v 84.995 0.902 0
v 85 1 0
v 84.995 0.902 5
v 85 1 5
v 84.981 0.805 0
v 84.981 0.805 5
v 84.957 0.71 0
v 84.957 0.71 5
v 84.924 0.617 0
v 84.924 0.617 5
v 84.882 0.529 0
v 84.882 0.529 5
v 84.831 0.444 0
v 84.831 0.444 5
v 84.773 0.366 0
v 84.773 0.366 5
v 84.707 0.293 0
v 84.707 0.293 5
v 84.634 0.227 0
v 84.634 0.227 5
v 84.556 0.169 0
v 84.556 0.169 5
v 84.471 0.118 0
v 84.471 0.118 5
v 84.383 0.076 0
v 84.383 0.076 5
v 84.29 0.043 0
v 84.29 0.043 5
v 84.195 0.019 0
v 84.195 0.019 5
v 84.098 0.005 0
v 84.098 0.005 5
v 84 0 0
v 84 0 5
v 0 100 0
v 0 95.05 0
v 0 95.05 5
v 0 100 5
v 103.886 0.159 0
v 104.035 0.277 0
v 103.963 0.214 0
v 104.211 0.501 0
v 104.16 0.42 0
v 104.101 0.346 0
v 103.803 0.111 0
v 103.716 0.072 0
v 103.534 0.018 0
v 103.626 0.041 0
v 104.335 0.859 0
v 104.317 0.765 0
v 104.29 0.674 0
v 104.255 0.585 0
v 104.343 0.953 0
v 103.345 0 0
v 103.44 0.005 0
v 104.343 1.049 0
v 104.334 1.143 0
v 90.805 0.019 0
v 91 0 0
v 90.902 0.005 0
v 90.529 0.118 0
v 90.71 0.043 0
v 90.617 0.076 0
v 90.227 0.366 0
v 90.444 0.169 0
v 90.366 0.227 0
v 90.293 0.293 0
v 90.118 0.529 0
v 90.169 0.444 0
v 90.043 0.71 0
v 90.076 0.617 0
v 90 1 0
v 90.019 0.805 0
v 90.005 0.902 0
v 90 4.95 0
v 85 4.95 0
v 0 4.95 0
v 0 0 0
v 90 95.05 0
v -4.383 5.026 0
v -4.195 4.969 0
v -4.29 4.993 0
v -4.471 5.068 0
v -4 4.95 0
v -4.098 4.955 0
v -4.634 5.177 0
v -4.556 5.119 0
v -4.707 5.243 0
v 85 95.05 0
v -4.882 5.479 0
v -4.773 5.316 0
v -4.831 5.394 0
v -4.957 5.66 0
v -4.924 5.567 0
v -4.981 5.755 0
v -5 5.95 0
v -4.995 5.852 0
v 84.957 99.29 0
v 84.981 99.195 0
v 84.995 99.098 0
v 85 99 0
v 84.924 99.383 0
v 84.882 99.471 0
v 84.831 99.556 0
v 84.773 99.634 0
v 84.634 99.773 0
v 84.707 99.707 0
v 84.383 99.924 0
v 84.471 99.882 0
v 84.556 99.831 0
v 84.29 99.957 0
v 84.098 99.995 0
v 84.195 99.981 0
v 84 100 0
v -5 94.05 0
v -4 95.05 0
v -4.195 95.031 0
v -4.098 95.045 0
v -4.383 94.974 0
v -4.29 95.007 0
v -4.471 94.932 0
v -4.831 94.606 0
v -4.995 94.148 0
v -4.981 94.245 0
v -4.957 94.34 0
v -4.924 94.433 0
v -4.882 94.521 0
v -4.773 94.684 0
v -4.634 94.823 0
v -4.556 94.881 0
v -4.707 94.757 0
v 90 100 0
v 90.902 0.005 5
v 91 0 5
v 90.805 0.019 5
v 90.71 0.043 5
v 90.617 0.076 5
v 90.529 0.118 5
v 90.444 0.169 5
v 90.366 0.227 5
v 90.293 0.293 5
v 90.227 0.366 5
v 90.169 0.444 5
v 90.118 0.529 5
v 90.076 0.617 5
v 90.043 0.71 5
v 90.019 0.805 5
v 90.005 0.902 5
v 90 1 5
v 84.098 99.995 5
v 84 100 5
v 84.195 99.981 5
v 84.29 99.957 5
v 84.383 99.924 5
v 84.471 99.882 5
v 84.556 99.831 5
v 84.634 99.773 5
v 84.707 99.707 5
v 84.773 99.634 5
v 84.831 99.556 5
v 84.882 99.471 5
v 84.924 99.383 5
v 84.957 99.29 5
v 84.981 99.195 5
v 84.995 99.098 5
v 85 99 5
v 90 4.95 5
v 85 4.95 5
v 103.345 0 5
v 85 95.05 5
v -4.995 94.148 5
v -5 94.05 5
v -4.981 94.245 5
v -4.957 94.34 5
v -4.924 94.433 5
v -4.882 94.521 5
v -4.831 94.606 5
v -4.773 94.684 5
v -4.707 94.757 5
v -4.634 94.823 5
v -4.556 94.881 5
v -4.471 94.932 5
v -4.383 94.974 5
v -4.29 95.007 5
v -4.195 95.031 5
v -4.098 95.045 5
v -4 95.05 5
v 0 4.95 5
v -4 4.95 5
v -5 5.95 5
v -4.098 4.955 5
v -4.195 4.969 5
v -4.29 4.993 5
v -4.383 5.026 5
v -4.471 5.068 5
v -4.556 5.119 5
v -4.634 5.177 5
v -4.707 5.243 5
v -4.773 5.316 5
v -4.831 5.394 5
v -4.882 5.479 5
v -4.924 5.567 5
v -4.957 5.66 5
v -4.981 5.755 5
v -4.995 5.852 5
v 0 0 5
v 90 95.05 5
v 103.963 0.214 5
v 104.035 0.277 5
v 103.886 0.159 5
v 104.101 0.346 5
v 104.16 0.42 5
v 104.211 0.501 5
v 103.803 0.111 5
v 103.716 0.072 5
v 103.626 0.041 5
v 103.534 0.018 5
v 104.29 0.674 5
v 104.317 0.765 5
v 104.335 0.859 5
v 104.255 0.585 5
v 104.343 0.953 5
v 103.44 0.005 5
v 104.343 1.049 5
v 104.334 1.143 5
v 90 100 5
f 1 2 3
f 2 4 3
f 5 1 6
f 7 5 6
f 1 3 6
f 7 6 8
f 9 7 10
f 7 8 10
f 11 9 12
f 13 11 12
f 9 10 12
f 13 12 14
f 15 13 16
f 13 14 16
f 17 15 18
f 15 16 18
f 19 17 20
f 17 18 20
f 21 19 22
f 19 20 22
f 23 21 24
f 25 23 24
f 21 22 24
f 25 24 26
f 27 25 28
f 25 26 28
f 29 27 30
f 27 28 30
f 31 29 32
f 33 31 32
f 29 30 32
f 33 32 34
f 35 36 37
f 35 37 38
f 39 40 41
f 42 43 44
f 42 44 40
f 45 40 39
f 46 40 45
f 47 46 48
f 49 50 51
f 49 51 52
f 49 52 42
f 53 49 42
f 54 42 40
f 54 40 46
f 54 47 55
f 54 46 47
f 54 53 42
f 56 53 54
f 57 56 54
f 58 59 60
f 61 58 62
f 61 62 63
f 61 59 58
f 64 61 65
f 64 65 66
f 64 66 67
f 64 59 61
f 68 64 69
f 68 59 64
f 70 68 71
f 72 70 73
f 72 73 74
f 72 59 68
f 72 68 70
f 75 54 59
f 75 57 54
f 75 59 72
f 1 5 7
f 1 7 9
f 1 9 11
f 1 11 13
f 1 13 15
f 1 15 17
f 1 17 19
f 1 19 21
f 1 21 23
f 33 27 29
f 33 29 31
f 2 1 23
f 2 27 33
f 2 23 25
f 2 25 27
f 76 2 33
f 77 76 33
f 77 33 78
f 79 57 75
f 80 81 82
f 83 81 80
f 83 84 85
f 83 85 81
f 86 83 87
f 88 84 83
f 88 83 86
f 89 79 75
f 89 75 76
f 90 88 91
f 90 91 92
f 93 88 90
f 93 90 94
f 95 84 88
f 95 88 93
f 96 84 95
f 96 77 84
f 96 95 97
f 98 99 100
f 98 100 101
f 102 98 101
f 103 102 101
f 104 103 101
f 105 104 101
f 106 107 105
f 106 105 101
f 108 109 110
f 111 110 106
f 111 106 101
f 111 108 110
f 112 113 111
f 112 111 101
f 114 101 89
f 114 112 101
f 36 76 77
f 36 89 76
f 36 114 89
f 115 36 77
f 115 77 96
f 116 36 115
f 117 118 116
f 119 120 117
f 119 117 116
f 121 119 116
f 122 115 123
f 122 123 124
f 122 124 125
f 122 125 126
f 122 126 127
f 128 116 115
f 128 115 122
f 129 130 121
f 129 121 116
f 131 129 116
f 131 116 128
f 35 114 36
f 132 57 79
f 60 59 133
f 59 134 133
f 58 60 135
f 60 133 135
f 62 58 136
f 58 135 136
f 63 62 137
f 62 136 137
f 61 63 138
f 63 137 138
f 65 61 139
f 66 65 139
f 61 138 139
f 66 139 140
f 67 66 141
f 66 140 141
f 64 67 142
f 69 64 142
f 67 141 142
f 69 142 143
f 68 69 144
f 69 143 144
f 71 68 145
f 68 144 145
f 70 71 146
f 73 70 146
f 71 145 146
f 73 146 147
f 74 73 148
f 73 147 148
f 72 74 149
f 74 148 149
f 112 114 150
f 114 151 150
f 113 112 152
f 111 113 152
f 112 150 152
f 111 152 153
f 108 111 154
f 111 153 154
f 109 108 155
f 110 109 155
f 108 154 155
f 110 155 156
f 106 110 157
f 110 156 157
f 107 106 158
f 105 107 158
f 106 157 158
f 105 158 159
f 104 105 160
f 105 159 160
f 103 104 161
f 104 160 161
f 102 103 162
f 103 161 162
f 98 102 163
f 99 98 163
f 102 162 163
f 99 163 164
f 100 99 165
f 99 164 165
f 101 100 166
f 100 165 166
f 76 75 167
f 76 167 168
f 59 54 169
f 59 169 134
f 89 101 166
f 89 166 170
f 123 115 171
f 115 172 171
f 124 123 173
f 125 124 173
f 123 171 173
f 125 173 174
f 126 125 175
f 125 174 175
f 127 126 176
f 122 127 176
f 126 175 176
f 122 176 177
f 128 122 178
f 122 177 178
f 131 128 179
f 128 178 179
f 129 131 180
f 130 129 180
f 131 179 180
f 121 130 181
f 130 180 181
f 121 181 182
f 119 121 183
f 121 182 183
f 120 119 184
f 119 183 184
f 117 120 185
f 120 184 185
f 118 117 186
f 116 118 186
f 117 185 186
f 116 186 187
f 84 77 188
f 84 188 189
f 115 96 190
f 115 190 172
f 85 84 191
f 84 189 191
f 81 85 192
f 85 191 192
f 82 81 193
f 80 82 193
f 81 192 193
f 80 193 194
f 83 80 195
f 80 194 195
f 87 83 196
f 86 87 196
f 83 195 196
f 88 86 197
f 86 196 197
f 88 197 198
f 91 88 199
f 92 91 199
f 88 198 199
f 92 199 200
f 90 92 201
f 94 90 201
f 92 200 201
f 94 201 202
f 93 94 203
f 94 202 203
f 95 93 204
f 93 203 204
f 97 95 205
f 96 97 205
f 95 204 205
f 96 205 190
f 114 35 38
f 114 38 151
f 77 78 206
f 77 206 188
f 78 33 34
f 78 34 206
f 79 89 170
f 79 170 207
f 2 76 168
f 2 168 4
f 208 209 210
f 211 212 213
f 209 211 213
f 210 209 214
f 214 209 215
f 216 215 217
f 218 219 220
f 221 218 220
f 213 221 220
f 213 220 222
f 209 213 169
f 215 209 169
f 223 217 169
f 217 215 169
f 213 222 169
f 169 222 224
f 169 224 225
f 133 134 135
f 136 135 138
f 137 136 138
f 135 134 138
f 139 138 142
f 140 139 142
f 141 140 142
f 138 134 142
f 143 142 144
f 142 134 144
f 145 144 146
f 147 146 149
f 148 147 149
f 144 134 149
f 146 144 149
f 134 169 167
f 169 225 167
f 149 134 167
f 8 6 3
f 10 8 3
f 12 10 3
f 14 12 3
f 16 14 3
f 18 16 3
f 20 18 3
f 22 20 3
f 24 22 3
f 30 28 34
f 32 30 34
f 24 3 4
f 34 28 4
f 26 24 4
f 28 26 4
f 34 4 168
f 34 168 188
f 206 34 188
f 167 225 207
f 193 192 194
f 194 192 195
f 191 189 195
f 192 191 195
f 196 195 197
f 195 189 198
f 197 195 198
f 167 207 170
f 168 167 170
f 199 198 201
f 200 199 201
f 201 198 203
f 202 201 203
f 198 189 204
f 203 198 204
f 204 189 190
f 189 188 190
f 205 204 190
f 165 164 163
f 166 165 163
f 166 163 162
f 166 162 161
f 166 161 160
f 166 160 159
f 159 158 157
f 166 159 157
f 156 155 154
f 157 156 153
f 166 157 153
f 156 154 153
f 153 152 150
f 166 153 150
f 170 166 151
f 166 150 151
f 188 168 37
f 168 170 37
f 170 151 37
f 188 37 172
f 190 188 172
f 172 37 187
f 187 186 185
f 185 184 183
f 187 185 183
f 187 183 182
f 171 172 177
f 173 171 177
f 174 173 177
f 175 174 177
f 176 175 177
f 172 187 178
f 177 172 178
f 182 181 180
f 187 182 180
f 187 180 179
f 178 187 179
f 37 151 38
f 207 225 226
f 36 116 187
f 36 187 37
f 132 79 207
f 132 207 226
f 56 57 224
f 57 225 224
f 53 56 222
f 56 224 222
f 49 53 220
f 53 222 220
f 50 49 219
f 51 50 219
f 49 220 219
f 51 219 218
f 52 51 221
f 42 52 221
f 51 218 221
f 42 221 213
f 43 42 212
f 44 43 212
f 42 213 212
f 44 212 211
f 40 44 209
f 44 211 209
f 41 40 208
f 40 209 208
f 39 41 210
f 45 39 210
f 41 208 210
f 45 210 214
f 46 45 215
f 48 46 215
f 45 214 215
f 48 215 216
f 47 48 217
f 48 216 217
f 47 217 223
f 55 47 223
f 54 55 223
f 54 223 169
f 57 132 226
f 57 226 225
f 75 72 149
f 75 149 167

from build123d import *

# Parameters (mm, degrees)
BOSS_EXTRUDE1_DEPTH = 5
FILLET1_R           = 1


with BuildPart() as part:
    # Sketch1 → Boss-Extrude1 (new body)
    with BuildSketch(Plane.XY):
        Polygon((0, 95.05), (0, 100), (85, 100), (85, 95.05), (90, 95.05), (90, 100), (104.5, 0), (90, 0), (90, 4.95), (85, 4.95), (85, 0), (0, 0), (0, 4.95), (-5, 4.95), (-5, 95.05), align=None)
    extrude(amount=BOSS_EXTRUDE1_DEPTH)

    # Fillet1
    fillet1_edges = [part.edges().sort_by_distance(p)[0] for p in [
        (-5, 4.95, 2.5),
        (-5, 95.05, 2.5),
        (85, 100, 2.5),
        (104.5, 0, 2.5),
        (90, 0, 2.5),
        (85, 0, 2.5),
    ]]
    fillet(fillet1_edges, radius=FILLET1_R)


solid = part.part
